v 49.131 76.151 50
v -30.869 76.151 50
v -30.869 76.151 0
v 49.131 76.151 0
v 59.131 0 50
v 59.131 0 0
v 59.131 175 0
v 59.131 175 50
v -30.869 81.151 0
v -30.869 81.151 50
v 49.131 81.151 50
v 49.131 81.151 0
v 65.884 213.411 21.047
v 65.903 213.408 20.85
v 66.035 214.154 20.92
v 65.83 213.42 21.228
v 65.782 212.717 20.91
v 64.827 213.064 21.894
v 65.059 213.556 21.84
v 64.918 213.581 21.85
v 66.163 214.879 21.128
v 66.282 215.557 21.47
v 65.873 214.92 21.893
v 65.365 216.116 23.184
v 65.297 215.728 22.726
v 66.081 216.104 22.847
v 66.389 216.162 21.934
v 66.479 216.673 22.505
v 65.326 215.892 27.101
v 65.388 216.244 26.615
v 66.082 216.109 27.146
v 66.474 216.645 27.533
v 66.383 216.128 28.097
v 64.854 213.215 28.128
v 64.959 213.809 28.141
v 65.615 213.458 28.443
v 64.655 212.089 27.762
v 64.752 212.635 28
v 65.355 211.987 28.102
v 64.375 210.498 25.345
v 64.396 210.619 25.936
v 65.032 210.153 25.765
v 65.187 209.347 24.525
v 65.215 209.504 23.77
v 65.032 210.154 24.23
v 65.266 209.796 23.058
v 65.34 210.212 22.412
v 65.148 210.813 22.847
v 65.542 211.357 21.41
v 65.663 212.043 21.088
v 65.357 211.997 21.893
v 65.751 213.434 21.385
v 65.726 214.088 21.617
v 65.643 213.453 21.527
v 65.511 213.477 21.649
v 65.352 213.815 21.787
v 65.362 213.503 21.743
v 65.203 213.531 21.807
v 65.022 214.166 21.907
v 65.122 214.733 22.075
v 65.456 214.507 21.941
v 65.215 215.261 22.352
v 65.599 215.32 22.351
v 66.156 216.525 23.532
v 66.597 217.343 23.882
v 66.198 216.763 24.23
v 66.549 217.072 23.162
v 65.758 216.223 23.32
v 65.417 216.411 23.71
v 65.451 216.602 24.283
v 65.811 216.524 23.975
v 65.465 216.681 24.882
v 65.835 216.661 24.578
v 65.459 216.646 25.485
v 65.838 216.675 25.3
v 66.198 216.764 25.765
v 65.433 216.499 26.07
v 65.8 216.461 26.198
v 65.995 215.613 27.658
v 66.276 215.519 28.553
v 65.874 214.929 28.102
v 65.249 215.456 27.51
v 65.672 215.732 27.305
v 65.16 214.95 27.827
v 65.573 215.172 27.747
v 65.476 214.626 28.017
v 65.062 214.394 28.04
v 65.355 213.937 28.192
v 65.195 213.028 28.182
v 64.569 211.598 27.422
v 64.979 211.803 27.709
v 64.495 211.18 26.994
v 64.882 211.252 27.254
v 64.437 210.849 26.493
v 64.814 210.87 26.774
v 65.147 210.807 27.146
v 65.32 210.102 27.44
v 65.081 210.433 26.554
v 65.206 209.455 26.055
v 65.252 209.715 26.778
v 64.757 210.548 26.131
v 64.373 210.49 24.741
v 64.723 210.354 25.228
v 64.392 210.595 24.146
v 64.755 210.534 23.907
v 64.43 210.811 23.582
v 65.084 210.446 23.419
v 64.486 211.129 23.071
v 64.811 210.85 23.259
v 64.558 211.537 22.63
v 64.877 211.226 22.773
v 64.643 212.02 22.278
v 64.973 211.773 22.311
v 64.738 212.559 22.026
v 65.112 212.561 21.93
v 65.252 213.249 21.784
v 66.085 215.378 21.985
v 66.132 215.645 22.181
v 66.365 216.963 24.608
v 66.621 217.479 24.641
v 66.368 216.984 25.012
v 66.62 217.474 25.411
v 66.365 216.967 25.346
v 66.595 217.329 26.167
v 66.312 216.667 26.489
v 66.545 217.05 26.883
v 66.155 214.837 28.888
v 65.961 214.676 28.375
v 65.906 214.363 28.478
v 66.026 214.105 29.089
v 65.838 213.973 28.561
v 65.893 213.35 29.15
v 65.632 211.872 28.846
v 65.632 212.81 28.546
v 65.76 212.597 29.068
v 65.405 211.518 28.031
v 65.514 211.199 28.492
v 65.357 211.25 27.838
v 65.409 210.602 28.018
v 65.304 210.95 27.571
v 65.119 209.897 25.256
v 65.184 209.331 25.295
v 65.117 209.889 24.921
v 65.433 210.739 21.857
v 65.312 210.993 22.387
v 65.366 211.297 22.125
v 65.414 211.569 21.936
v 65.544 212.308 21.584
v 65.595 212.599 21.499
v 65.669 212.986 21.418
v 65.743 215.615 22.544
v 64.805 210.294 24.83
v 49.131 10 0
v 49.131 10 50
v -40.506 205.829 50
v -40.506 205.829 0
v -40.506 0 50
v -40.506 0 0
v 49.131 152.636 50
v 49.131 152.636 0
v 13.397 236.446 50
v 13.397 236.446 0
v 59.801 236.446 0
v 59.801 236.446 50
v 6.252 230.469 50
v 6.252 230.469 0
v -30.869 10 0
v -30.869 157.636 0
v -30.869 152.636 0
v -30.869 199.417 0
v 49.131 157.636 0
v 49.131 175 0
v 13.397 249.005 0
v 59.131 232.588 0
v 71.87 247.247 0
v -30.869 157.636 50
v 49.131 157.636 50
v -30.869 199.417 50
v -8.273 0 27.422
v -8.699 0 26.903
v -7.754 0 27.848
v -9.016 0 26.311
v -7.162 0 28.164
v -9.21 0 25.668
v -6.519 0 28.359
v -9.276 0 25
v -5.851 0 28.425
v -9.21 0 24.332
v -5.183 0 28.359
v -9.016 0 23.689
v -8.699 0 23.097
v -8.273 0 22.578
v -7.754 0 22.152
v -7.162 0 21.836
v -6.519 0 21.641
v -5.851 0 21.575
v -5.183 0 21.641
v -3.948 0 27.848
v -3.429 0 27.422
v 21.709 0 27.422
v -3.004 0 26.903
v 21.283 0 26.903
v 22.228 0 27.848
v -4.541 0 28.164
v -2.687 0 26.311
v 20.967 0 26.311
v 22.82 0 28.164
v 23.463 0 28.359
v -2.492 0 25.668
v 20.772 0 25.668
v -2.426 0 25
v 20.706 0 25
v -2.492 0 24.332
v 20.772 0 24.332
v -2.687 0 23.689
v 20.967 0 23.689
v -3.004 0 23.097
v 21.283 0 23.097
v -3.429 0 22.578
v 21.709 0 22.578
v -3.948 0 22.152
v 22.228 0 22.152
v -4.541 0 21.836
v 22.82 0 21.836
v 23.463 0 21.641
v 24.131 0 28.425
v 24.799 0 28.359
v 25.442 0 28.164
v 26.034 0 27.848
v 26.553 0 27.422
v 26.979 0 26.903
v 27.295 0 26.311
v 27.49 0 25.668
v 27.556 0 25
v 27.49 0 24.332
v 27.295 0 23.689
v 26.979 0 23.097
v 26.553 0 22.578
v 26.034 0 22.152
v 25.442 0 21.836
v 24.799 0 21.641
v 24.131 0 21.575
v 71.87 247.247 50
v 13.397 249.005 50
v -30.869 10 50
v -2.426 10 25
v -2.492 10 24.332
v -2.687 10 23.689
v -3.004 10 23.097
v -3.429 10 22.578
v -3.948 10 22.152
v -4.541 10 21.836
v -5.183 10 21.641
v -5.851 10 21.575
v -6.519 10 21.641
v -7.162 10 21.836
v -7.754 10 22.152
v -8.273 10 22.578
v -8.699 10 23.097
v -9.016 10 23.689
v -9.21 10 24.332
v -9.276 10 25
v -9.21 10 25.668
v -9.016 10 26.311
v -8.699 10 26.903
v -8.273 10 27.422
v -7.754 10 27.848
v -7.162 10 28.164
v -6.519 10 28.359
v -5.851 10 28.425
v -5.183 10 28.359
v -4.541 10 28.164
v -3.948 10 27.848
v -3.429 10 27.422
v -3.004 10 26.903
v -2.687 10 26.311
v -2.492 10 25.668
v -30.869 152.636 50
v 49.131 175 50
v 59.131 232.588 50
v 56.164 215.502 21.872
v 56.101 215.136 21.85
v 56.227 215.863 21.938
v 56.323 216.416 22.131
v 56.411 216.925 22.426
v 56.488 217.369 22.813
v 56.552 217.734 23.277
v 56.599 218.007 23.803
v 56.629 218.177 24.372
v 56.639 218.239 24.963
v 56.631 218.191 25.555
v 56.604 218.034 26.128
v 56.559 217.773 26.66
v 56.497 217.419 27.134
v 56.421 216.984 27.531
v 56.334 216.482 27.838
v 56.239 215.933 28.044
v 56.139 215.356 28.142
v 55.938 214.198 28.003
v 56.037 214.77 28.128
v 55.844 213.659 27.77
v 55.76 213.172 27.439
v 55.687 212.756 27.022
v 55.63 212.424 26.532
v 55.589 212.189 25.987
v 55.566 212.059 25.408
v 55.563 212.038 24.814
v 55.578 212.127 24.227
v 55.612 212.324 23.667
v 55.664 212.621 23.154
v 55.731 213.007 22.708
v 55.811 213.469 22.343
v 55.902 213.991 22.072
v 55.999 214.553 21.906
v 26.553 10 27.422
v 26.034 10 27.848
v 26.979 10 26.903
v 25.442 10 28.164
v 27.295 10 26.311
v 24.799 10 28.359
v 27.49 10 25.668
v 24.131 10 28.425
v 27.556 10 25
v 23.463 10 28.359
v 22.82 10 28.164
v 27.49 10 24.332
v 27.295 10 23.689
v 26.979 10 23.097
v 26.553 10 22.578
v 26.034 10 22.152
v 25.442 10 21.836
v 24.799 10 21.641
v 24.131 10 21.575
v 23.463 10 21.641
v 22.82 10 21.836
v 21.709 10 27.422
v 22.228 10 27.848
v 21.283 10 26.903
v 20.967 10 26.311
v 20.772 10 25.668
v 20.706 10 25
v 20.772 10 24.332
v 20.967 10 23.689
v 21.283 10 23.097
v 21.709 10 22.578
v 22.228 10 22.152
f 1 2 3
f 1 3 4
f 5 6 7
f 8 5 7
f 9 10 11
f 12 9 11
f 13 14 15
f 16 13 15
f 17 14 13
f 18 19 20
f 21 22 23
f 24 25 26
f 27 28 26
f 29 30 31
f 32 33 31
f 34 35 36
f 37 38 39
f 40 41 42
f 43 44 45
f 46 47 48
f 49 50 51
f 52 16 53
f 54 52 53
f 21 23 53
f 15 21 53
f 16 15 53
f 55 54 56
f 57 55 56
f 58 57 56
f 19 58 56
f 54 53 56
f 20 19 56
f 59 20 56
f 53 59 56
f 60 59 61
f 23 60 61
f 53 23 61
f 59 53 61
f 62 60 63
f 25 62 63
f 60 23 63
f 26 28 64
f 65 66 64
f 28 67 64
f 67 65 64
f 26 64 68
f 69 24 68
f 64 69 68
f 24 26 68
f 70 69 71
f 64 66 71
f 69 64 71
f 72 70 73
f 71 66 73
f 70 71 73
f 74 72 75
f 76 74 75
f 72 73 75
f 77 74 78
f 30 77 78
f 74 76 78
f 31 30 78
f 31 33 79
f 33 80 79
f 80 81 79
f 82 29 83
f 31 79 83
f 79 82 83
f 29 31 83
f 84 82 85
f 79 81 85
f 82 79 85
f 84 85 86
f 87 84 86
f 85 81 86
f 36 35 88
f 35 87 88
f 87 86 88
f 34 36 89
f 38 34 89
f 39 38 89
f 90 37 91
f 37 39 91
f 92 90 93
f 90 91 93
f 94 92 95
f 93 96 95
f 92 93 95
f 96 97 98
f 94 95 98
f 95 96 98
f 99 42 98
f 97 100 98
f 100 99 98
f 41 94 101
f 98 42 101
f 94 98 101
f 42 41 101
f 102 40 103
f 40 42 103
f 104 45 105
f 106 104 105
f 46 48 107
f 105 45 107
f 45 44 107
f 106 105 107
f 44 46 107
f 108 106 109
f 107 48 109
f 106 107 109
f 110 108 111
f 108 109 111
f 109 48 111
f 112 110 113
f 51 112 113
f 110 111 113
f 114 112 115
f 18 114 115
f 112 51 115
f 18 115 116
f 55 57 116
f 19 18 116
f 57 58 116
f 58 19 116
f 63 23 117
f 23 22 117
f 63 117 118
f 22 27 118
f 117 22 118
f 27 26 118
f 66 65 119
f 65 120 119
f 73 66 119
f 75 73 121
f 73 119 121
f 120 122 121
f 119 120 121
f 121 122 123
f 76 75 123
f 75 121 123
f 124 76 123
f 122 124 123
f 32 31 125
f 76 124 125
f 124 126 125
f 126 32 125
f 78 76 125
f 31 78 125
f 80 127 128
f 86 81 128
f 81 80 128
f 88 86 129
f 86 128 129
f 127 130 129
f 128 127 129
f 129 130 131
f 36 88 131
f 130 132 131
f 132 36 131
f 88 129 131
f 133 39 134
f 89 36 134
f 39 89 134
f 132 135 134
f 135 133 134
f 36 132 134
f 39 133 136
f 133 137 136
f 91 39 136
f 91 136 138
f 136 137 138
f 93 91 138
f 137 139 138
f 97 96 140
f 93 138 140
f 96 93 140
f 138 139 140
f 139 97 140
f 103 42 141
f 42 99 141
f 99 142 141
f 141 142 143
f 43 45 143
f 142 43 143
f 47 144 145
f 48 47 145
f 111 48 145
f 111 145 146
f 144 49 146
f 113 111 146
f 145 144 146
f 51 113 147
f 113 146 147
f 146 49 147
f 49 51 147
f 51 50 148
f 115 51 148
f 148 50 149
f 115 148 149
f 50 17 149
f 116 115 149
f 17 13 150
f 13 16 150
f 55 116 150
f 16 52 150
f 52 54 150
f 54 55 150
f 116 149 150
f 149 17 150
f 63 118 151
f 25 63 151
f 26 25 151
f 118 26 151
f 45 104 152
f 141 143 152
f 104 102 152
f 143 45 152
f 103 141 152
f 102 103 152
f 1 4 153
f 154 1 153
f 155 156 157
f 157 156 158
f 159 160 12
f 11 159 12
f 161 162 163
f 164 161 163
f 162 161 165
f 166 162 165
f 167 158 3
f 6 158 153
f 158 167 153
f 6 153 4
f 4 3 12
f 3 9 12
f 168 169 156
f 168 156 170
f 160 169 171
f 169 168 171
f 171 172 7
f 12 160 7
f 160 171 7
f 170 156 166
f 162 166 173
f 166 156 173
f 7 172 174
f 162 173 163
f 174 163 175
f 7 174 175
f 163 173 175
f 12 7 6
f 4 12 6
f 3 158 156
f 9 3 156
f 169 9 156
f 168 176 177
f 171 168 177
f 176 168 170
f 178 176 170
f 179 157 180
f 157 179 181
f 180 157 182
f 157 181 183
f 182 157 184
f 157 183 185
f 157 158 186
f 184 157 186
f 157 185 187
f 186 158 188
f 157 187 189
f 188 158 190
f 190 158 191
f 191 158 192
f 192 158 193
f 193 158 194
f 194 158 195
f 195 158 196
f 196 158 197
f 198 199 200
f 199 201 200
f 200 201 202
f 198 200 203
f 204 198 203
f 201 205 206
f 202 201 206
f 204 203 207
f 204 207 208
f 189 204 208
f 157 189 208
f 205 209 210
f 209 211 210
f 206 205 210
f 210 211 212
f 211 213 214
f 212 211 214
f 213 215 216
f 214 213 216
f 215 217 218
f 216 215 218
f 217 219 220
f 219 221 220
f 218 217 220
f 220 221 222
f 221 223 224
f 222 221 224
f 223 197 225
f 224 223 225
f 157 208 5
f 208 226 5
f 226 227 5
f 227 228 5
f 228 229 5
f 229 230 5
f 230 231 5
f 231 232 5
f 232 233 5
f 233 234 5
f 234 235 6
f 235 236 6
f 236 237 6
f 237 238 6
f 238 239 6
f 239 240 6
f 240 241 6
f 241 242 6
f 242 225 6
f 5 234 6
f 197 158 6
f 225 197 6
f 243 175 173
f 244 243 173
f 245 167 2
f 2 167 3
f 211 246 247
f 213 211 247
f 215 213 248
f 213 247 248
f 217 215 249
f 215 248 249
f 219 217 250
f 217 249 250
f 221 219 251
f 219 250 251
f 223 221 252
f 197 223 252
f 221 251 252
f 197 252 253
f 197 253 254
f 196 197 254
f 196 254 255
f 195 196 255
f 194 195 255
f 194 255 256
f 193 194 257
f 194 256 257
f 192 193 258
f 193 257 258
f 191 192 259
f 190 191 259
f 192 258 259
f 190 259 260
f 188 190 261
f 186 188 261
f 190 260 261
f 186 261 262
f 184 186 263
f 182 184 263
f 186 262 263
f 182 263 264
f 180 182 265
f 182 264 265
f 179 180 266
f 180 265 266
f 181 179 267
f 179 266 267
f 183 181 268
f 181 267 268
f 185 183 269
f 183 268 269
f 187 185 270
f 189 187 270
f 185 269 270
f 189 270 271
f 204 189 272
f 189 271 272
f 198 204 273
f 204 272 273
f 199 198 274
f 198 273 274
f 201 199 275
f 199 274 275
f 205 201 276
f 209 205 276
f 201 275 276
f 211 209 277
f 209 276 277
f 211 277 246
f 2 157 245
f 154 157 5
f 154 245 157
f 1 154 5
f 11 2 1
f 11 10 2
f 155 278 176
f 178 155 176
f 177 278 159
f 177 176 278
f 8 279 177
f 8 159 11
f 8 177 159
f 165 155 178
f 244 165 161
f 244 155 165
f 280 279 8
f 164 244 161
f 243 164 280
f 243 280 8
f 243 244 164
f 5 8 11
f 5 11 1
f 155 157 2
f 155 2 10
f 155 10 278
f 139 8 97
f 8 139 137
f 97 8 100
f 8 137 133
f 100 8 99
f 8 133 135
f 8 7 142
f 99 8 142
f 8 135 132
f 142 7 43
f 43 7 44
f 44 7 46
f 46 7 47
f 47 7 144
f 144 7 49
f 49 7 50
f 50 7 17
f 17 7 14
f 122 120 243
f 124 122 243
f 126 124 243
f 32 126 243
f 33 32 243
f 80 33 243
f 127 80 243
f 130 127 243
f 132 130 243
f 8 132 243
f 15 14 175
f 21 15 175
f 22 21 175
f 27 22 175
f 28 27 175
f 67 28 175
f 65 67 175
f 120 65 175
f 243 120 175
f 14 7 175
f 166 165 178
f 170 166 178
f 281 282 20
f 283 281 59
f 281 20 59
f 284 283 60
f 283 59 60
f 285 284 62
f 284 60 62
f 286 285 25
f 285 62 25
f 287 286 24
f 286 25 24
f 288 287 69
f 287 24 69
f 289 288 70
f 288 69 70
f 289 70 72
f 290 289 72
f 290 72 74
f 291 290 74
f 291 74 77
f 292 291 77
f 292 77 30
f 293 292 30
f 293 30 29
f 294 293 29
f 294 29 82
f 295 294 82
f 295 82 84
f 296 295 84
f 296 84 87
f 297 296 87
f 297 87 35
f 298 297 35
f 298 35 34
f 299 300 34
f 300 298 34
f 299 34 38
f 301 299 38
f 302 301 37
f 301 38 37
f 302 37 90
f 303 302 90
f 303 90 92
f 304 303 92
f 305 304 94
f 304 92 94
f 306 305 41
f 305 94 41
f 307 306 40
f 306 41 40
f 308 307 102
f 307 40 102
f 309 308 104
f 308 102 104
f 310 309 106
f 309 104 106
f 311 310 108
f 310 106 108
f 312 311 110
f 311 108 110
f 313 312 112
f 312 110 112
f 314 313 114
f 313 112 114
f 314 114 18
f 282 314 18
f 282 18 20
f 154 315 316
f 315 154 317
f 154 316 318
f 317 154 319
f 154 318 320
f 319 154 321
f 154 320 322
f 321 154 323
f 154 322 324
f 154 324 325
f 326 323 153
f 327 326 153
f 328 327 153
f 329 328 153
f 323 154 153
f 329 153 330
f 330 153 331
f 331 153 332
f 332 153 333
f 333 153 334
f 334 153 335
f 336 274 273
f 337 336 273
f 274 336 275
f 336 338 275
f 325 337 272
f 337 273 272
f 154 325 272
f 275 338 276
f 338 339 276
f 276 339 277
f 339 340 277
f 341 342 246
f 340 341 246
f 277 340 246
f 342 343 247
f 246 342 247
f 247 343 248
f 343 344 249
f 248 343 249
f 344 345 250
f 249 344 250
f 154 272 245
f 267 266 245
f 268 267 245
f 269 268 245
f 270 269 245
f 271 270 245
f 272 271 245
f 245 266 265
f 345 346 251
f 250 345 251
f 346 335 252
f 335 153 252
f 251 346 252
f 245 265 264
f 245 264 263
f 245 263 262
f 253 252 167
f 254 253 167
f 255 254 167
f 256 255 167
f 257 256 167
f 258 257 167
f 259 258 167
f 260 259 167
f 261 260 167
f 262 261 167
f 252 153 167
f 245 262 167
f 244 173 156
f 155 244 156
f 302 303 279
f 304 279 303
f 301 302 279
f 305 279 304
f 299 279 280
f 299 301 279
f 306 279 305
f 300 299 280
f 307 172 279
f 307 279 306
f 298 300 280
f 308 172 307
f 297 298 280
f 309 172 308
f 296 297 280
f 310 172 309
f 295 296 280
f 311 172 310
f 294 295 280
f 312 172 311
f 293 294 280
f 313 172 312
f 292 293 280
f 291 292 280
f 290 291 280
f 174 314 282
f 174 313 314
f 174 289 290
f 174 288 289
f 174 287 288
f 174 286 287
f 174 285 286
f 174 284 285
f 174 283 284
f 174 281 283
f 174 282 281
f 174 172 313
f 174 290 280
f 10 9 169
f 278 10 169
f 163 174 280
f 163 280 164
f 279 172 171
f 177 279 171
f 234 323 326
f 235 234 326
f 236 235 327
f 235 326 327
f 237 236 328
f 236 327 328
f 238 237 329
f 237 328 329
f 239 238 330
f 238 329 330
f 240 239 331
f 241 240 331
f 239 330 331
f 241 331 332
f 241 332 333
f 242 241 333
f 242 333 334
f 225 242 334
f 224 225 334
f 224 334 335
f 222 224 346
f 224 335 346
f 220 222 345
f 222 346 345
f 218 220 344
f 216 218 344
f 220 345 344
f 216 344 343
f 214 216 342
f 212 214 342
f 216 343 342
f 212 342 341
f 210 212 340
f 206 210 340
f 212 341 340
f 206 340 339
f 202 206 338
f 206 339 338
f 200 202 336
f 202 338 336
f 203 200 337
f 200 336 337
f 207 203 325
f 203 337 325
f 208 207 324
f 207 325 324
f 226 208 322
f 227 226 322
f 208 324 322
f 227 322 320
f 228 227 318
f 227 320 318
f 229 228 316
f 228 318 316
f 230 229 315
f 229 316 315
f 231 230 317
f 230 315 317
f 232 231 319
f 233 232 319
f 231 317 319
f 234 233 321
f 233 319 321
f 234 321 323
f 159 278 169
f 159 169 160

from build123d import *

# Parameters (mm, degrees)
BOSS_EXTRUDE1_DEPTH = 50
SKETCH10_R          = 3.425
CUT_EXTRUDE5_DEPTH  = 10
SKETCH11_W          = 80
SKETCH11_H          = 5
BOSS_EXTRUDE3_DEPTH = 50
SKETCH14_R          = 3.15
CUT_EXTRUDE6_DEPTH  = 10
FILLET1_R           = 1


with BuildPart() as part:
    # Sketch2 → Boss-Extrude1 (new body)
    with BuildSketch(Plane.XY):
        Polygon((-40.506485759, 0), (59.130974018, 0), (59.130974018, 175), (71.870010435, 247.246665631), (13.397315769, 249.004598584), (-40.506485759, 205.829132158), align=None)
        Polygon((59.130974018, 232.587704831), (59.8009874, 236.446158122), (42.633663102, 236.446158122), (13.397315769, 236.446158122), (6.25157797, 230.468732297), (-30.869025982, 199.417263157), (-30.869025982, 107.989726368), (-30.869025982, 10), (0, 10), (49.130974018, 10), (49.130974018, 87.5), (49.130974018, 175), align=None, mode=Mode.SUBTRACT)
    extrude(amount=BOSS_EXTRUDE1_DEPTH)

    # Sketch10 → Cut-Extrude5 (cut)
    with BuildSketch(Plane(origin=(0, 10, 0), x_dir=(1, 0, 0), z_dir=(0, 1, 0))):
        with Locations((-5.851287133, -25)):
            Circle(SKETCH10_R)
        with Locations((24.130974018, -25)):
            Circle(SKETCH10_R)
    extrude(amount=-CUT_EXTRUDE5_DEPTH, mode=Mode.SUBTRACT)

    # Sketch11 → Boss-Extrude3 (add)
    with BuildSketch(Plane.XY.offset(50)):
        with Locations((9.130974018, 155.135730726)):
            Rectangle(SKETCH11_W, SKETCH11_H)
        with Locations((9.130974018, 78.651297101)):
            Rectangle(SKETCH11_W, SKETCH11_H)
    extrude(amount=-BOSS_EXTRUDE3_DEPTH)

    # Sketch14 → Cut-Extrude6 (cut)
    with BuildSketch(Plane(origin=(27.42119444, -4.835096423, 0), x_dir=(0, 0, -1), z_dir=(0.984807753, -0.173648178, 0))):
        with Locations((-25, 221.609342659)):
            Circle(SKETCH14_R)
    extrude(amount=-CUT_EXTRUDE6_DEPTH, mode=Mode.SUBTRACT)

    # Fillet1
    fillet1_edges = [part.edges().sort_by_distance(p)[0] for p in [
        (65.903252947, 213.407502367, 28.15),
    ]]
    fillet(fillet1_edges, radius=FILLET1_R)


solid = part.part
